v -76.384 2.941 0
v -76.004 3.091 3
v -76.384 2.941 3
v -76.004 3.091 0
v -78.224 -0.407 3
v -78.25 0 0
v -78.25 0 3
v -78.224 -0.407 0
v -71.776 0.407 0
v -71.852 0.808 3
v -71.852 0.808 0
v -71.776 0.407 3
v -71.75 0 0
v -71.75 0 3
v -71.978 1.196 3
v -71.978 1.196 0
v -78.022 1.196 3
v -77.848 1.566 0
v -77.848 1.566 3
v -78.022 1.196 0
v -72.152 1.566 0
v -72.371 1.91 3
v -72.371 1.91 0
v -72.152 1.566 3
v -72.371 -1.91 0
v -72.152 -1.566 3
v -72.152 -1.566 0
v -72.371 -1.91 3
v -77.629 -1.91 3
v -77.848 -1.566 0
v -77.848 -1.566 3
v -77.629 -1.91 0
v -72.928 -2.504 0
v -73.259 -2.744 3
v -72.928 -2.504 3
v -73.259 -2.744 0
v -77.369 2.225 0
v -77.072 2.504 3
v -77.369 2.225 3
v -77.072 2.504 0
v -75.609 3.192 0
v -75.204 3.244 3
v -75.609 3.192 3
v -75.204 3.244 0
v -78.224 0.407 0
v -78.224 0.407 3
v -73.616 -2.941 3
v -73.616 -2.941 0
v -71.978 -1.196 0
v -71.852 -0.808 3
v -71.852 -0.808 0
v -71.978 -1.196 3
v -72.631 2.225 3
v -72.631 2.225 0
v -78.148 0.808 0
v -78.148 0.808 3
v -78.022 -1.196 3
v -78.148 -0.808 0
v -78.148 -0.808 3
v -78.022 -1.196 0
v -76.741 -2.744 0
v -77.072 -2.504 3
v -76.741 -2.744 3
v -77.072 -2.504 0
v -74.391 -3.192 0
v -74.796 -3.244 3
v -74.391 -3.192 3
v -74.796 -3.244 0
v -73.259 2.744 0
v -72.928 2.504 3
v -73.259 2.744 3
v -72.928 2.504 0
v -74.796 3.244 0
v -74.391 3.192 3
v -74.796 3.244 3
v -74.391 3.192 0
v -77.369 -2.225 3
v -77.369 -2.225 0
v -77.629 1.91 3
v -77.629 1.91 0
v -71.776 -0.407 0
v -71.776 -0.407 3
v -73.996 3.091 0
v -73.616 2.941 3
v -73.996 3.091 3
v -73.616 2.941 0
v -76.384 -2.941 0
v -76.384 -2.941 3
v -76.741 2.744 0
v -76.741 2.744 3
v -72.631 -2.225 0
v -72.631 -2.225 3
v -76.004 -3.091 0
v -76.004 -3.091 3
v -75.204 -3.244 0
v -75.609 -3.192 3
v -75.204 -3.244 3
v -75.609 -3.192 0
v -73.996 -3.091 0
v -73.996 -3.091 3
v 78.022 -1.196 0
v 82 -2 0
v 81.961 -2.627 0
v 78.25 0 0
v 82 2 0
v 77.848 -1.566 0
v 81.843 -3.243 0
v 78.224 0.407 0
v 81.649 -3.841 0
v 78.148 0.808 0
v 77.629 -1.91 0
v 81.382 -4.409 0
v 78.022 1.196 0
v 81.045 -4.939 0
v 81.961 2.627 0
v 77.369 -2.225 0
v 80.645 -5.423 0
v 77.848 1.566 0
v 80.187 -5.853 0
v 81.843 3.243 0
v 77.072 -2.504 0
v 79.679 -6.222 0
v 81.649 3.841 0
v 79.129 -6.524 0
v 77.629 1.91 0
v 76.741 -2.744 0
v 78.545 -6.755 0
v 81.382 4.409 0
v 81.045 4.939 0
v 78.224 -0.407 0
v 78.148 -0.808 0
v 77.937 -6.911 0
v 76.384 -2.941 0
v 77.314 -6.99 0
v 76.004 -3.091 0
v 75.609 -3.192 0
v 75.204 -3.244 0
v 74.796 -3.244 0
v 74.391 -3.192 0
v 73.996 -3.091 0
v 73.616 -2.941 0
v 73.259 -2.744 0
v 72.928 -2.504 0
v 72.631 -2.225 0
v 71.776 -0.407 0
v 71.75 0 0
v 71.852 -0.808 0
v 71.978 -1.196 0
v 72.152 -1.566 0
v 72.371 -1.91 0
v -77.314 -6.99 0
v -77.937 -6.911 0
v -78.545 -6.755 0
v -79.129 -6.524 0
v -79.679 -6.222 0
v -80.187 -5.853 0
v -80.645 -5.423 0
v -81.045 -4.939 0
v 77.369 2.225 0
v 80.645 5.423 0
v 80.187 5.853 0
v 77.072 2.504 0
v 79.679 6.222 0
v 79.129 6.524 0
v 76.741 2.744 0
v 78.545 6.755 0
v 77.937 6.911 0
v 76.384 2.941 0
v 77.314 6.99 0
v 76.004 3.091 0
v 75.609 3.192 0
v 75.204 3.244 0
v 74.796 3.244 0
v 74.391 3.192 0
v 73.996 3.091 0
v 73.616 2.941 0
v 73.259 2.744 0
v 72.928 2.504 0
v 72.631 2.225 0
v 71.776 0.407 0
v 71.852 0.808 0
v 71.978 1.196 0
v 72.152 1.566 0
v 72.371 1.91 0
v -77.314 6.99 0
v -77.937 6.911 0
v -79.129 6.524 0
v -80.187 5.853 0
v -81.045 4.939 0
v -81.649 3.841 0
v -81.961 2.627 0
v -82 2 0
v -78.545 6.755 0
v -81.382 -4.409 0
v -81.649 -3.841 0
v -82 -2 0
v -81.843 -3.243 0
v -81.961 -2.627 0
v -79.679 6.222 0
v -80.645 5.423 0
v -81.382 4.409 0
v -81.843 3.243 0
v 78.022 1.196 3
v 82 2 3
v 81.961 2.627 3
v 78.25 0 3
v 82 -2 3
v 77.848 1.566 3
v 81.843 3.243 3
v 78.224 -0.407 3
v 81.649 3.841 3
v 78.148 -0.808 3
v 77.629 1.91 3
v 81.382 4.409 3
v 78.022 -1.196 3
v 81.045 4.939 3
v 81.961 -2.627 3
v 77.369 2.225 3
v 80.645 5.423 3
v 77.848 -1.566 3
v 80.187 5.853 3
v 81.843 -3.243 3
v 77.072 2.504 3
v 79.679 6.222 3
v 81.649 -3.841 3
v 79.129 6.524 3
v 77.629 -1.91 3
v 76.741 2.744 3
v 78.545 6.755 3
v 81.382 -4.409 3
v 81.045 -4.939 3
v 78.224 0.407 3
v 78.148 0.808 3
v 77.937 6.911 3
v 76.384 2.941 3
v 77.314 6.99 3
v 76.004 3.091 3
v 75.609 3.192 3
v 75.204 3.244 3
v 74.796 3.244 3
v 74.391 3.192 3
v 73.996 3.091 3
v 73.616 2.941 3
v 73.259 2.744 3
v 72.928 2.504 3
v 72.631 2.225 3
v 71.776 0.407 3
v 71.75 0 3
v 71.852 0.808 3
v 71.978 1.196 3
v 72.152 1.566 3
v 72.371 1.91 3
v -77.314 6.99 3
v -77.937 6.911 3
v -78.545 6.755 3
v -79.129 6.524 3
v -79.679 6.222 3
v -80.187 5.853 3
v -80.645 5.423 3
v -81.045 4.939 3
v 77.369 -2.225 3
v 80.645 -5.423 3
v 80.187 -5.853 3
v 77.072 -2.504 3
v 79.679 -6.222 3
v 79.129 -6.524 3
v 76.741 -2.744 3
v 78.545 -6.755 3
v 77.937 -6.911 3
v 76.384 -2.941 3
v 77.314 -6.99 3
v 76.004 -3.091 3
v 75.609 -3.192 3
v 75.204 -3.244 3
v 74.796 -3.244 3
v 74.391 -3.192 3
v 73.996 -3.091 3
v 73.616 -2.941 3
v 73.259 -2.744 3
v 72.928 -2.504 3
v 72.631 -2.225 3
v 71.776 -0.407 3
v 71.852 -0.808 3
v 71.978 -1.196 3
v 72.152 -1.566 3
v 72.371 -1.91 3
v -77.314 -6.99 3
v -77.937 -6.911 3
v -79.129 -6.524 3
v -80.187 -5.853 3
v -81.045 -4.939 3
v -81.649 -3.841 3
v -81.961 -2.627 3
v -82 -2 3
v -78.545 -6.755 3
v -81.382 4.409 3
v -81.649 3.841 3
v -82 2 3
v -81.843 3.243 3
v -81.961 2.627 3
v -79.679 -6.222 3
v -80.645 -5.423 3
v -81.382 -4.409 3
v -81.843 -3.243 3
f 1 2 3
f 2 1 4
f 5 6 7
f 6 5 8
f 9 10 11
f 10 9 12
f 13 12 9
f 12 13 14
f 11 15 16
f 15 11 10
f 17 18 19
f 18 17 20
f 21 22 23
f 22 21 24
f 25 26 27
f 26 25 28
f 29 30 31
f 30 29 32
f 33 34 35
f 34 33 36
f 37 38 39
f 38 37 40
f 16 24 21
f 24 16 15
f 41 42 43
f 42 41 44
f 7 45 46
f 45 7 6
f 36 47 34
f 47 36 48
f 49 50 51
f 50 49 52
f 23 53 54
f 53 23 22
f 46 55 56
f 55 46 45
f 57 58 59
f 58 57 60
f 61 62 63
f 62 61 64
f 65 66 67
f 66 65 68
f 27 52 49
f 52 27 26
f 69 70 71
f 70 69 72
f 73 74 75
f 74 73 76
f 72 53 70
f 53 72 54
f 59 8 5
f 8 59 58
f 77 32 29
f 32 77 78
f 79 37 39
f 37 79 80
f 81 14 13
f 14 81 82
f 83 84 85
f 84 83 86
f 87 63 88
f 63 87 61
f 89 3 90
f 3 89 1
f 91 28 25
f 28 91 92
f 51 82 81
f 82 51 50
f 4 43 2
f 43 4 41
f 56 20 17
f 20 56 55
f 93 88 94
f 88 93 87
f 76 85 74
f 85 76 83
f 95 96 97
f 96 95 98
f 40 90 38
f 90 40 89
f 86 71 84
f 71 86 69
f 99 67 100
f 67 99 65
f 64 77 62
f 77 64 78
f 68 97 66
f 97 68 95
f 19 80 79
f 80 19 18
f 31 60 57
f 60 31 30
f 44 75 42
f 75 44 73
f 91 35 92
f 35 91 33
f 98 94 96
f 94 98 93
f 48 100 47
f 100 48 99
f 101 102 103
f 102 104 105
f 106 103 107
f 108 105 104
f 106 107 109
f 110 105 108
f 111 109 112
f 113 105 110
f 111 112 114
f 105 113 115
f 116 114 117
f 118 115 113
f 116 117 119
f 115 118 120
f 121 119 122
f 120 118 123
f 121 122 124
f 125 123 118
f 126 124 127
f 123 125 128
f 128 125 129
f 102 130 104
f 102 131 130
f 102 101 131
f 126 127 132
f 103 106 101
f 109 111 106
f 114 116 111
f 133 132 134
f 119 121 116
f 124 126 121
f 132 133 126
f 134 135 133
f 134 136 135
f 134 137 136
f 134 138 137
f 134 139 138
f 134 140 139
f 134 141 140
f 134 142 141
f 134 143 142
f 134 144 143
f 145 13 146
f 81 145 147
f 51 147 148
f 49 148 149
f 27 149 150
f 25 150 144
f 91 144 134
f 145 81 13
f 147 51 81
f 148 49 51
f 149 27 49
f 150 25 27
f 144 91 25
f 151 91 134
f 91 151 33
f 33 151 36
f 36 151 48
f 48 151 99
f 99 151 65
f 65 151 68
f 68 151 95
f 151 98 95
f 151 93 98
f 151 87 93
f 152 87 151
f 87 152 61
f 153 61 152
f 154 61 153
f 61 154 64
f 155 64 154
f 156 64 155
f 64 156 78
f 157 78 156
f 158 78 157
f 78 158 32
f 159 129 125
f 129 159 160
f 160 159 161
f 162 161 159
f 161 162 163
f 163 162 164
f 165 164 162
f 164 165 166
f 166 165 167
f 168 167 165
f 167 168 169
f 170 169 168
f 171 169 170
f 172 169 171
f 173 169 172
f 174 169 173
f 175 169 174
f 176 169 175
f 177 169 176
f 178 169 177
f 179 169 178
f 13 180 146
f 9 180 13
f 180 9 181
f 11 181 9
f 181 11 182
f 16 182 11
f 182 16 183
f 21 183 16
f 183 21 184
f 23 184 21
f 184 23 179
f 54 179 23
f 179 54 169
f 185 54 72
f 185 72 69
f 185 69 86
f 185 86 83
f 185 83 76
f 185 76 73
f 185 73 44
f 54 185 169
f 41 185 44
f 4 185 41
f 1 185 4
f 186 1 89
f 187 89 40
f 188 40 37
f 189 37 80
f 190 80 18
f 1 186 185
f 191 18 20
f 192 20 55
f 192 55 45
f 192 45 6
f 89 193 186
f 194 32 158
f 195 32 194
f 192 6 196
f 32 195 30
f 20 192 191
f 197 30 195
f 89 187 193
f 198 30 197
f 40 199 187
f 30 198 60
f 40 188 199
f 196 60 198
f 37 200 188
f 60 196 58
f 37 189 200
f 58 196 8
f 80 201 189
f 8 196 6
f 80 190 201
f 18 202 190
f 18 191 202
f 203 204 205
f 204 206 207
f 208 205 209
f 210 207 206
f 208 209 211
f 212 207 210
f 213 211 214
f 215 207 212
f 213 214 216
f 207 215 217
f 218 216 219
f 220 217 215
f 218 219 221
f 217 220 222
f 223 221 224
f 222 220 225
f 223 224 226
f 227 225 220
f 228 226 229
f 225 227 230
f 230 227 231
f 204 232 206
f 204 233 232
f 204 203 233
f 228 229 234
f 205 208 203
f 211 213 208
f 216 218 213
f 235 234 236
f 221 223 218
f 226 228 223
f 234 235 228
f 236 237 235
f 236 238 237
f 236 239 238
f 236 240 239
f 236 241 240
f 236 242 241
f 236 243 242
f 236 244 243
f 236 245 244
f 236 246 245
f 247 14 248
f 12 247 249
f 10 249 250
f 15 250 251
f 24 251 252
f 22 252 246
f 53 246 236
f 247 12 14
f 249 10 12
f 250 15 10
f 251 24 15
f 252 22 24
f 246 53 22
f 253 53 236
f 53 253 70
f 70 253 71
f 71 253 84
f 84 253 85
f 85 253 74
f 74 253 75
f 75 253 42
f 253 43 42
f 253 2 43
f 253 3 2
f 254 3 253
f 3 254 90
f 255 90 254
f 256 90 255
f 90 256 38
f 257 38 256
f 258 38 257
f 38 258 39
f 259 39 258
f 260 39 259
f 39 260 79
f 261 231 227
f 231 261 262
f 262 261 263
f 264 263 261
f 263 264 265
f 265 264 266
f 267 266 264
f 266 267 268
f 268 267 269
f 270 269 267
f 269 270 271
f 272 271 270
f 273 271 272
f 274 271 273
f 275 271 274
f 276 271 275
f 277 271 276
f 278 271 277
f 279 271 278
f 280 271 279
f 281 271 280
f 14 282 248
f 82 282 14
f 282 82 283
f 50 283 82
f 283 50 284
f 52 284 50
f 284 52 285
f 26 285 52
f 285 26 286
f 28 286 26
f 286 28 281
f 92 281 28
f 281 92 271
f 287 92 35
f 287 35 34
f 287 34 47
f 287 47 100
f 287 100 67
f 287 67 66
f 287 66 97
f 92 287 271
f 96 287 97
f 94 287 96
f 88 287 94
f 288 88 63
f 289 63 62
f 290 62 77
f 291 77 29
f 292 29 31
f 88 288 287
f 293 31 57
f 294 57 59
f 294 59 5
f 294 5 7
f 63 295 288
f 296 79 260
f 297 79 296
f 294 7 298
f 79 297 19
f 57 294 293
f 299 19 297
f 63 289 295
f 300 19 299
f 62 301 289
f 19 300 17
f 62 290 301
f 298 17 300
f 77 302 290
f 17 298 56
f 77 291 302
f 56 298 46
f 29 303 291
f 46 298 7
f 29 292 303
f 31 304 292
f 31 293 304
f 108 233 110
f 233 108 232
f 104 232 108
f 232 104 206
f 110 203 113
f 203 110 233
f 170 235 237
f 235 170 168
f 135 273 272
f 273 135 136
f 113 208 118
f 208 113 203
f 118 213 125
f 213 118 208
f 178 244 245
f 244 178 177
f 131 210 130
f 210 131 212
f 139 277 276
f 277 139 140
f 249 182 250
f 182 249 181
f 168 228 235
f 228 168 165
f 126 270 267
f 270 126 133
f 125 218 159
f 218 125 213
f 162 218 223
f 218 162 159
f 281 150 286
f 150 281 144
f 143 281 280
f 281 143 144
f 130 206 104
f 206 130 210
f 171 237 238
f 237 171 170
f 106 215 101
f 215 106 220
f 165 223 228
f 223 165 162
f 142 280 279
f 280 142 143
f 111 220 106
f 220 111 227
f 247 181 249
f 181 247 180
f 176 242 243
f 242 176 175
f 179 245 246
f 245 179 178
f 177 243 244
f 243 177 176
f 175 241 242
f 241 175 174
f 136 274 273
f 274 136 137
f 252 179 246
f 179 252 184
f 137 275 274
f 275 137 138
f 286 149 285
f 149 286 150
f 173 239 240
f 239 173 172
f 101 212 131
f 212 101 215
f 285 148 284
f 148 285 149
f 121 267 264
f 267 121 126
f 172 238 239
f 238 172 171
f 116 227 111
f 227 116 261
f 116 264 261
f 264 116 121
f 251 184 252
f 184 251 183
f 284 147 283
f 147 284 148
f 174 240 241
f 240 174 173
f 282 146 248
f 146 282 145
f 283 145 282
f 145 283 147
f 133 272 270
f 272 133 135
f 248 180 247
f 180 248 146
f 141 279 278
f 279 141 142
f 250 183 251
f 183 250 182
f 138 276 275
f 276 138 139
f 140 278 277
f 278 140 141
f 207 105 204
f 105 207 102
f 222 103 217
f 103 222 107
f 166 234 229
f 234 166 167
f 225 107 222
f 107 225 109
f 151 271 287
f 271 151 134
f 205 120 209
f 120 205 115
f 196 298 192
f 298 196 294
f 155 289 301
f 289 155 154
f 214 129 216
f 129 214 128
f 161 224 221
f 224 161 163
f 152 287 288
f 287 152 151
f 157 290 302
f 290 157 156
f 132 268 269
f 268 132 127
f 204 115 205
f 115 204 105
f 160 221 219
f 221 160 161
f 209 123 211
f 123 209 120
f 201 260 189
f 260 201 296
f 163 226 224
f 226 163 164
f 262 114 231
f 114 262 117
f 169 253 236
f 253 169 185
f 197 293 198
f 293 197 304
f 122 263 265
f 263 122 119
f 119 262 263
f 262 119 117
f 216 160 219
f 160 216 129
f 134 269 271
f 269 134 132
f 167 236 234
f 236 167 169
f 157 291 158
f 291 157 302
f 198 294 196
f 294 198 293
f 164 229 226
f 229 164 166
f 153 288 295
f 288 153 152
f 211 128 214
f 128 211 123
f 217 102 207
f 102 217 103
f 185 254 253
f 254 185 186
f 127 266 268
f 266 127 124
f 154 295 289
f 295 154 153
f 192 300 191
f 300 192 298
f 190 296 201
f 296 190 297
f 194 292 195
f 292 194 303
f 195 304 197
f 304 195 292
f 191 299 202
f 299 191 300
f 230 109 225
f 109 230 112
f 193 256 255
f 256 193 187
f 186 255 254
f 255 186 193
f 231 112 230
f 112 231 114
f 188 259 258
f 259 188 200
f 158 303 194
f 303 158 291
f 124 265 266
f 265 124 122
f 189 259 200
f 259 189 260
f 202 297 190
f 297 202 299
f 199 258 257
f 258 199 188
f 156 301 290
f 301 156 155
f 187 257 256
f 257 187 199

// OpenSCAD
$fn = 50;


difference() {
	union() {
		hull() {
			translate(v = [-77.0000000000, 2.0000000000, 0]) {
				cylinder(h = 3, r = 5);
			}
			translate(v = [77.0000000000, 2.0000000000, 0]) {
				cylinder(h = 3, r = 5);
			}
			translate(v = [-77.0000000000, -2.0000000000, 0]) {
				cylinder(h = 3, r = 5);
			}
			translate(v = [77.0000000000, -2.0000000000, 0]) {
				cylinder(h = 3, r = 5);
			}
		}
	}
	union() {
		translate(v = [-75.0000000000, 0.0000000000, 0]) {
			cylinder(h = 3, r = 3.2500000000);
		}
		translate(v = [75.0000000000, 0.0000000000, 0]) {
			cylinder(h = 3, r = 3.2500000000);
		}
		translate(v = [-75.0000000000, 0.0000000000, 0]) {
			cylinder(h = 3, r = 1.8000000000);
		}
		translate(v = [75.0000000000, 0.0000000000, 0]) {
			cylinder(h = 3, r = 1.8000000000);
		}
		translate(v = [-75.0000000000, 0.0000000000, 0]) {
			cylinder(h = 3, r = 1.8000000000);
		}
		translate(v = [75.0000000000, 0.0000000000, 0]) {
			cylinder(h = 3, r = 1.8000000000);
		}
		translate(v = [-75.0000000000, 0.0000000000, 0]) {
			cylinder(h = 3, r = 1.8000000000);
		}
		translate(v = [75.0000000000, 0.0000000000, 0]) {
			cylinder(h = 3, r = 1.8000000000);
		}
	}
}
